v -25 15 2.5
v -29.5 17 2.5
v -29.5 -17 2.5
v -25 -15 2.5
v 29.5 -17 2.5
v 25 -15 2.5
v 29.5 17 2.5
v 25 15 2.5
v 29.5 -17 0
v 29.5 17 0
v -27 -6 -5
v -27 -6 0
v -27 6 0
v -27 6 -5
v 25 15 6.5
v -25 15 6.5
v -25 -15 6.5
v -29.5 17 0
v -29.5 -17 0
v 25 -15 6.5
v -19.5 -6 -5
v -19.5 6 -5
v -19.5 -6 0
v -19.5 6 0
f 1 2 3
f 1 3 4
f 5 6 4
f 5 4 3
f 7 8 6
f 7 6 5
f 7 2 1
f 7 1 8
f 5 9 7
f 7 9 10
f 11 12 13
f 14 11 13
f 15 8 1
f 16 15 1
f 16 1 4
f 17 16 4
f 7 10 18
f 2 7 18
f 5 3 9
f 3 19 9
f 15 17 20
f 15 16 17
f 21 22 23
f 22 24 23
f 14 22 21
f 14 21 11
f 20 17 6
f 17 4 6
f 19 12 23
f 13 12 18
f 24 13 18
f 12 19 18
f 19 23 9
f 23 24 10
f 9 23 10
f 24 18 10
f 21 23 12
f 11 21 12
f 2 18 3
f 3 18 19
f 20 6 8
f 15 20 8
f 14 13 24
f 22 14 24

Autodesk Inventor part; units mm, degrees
ref_plane "YZ Plane" through (0, 0, 0) normal (1, 0, 0) x (0, 1, 0)
ref_plane "XZ Plane" through (0, 0, 0) normal (0, 1, 0) x (-1, 0, 0)
ref_plane "XY Plane" through (0, 0, 0) normal (0, 0, 1) x (1, 0, 0)
sketch "Sketch1" plane through (0, 0, 0) normal (0, 0, 1) x (1, 0, 0)
  line L0 (-29.5, -17) -> (29.5, -17)
  line L1 (29.5, -17) -> (29.5, 17)
  line L2 (29.5, 17) -> (-29.5, 17)
  line L3 (-29.5, 17) -> (-29.5, -17)
  line L4 (-29.5, -17) -> (29.5, 17) construction
  line L5 (29.5, -17) -> (-29.5, 17) construction
  point P0 (0, 0)
  dimension "d0" = 59
  dimension "d1" = 34
extrude "Extrusion1" add sketch "Sketch1" along normal blind 2.5
sketch "Sketch2" plane through (0, 0, 2.5) normal (0, 0, 1) x (1, 0, 0)
  line L0 (-25, -15) -> (25, -15)
  line L1 (25, -15) -> (25, 15)
  line L2 (25, 15) -> (-25, 15)
  line L3 (-25, 15) -> (-25, -15)
  line L4 (-25, -15) -> (25, 15) construction
  line L5 (25, -15) -> (-25, 15) construction
  point P0 (0, 0)
  dimension "d4" = 50
  dimension "d5" = 30
extrude "Extrusion2" add sketch "Sketch2" along normal blind 4
sketch "Sketch3" plane through (0, 0, 0) normal (0, 0, -1) x (-1, 0, 0)
  line L0 (-41.3, 0) -> (41.3, 0) projected
  line L1 (27, 6) -> (19.5, 6)
  line L2 (19.5, 6) -> (19.5, -6)
  line L3 (19.5, -6) -> (27, -6)
  line L4 (27, -6) -> (27, 6)
  line L5 (27, 6) -> (19.5, -6) construction
  line L6 (19.5, 6) -> (27, -6) construction
  line L7 (29.5, 17) -> (29.5, -17) projected
  point P0 (0, 0)
  point P1 (23.25, 0)
  dimension "d8" = 7.5
  dimension "d9" = 12
  dimension "d10" = 2.5
extrude "Extrusion3" add sketch "Sketch3" along normal blind 5
properties part number "lcdsw"
